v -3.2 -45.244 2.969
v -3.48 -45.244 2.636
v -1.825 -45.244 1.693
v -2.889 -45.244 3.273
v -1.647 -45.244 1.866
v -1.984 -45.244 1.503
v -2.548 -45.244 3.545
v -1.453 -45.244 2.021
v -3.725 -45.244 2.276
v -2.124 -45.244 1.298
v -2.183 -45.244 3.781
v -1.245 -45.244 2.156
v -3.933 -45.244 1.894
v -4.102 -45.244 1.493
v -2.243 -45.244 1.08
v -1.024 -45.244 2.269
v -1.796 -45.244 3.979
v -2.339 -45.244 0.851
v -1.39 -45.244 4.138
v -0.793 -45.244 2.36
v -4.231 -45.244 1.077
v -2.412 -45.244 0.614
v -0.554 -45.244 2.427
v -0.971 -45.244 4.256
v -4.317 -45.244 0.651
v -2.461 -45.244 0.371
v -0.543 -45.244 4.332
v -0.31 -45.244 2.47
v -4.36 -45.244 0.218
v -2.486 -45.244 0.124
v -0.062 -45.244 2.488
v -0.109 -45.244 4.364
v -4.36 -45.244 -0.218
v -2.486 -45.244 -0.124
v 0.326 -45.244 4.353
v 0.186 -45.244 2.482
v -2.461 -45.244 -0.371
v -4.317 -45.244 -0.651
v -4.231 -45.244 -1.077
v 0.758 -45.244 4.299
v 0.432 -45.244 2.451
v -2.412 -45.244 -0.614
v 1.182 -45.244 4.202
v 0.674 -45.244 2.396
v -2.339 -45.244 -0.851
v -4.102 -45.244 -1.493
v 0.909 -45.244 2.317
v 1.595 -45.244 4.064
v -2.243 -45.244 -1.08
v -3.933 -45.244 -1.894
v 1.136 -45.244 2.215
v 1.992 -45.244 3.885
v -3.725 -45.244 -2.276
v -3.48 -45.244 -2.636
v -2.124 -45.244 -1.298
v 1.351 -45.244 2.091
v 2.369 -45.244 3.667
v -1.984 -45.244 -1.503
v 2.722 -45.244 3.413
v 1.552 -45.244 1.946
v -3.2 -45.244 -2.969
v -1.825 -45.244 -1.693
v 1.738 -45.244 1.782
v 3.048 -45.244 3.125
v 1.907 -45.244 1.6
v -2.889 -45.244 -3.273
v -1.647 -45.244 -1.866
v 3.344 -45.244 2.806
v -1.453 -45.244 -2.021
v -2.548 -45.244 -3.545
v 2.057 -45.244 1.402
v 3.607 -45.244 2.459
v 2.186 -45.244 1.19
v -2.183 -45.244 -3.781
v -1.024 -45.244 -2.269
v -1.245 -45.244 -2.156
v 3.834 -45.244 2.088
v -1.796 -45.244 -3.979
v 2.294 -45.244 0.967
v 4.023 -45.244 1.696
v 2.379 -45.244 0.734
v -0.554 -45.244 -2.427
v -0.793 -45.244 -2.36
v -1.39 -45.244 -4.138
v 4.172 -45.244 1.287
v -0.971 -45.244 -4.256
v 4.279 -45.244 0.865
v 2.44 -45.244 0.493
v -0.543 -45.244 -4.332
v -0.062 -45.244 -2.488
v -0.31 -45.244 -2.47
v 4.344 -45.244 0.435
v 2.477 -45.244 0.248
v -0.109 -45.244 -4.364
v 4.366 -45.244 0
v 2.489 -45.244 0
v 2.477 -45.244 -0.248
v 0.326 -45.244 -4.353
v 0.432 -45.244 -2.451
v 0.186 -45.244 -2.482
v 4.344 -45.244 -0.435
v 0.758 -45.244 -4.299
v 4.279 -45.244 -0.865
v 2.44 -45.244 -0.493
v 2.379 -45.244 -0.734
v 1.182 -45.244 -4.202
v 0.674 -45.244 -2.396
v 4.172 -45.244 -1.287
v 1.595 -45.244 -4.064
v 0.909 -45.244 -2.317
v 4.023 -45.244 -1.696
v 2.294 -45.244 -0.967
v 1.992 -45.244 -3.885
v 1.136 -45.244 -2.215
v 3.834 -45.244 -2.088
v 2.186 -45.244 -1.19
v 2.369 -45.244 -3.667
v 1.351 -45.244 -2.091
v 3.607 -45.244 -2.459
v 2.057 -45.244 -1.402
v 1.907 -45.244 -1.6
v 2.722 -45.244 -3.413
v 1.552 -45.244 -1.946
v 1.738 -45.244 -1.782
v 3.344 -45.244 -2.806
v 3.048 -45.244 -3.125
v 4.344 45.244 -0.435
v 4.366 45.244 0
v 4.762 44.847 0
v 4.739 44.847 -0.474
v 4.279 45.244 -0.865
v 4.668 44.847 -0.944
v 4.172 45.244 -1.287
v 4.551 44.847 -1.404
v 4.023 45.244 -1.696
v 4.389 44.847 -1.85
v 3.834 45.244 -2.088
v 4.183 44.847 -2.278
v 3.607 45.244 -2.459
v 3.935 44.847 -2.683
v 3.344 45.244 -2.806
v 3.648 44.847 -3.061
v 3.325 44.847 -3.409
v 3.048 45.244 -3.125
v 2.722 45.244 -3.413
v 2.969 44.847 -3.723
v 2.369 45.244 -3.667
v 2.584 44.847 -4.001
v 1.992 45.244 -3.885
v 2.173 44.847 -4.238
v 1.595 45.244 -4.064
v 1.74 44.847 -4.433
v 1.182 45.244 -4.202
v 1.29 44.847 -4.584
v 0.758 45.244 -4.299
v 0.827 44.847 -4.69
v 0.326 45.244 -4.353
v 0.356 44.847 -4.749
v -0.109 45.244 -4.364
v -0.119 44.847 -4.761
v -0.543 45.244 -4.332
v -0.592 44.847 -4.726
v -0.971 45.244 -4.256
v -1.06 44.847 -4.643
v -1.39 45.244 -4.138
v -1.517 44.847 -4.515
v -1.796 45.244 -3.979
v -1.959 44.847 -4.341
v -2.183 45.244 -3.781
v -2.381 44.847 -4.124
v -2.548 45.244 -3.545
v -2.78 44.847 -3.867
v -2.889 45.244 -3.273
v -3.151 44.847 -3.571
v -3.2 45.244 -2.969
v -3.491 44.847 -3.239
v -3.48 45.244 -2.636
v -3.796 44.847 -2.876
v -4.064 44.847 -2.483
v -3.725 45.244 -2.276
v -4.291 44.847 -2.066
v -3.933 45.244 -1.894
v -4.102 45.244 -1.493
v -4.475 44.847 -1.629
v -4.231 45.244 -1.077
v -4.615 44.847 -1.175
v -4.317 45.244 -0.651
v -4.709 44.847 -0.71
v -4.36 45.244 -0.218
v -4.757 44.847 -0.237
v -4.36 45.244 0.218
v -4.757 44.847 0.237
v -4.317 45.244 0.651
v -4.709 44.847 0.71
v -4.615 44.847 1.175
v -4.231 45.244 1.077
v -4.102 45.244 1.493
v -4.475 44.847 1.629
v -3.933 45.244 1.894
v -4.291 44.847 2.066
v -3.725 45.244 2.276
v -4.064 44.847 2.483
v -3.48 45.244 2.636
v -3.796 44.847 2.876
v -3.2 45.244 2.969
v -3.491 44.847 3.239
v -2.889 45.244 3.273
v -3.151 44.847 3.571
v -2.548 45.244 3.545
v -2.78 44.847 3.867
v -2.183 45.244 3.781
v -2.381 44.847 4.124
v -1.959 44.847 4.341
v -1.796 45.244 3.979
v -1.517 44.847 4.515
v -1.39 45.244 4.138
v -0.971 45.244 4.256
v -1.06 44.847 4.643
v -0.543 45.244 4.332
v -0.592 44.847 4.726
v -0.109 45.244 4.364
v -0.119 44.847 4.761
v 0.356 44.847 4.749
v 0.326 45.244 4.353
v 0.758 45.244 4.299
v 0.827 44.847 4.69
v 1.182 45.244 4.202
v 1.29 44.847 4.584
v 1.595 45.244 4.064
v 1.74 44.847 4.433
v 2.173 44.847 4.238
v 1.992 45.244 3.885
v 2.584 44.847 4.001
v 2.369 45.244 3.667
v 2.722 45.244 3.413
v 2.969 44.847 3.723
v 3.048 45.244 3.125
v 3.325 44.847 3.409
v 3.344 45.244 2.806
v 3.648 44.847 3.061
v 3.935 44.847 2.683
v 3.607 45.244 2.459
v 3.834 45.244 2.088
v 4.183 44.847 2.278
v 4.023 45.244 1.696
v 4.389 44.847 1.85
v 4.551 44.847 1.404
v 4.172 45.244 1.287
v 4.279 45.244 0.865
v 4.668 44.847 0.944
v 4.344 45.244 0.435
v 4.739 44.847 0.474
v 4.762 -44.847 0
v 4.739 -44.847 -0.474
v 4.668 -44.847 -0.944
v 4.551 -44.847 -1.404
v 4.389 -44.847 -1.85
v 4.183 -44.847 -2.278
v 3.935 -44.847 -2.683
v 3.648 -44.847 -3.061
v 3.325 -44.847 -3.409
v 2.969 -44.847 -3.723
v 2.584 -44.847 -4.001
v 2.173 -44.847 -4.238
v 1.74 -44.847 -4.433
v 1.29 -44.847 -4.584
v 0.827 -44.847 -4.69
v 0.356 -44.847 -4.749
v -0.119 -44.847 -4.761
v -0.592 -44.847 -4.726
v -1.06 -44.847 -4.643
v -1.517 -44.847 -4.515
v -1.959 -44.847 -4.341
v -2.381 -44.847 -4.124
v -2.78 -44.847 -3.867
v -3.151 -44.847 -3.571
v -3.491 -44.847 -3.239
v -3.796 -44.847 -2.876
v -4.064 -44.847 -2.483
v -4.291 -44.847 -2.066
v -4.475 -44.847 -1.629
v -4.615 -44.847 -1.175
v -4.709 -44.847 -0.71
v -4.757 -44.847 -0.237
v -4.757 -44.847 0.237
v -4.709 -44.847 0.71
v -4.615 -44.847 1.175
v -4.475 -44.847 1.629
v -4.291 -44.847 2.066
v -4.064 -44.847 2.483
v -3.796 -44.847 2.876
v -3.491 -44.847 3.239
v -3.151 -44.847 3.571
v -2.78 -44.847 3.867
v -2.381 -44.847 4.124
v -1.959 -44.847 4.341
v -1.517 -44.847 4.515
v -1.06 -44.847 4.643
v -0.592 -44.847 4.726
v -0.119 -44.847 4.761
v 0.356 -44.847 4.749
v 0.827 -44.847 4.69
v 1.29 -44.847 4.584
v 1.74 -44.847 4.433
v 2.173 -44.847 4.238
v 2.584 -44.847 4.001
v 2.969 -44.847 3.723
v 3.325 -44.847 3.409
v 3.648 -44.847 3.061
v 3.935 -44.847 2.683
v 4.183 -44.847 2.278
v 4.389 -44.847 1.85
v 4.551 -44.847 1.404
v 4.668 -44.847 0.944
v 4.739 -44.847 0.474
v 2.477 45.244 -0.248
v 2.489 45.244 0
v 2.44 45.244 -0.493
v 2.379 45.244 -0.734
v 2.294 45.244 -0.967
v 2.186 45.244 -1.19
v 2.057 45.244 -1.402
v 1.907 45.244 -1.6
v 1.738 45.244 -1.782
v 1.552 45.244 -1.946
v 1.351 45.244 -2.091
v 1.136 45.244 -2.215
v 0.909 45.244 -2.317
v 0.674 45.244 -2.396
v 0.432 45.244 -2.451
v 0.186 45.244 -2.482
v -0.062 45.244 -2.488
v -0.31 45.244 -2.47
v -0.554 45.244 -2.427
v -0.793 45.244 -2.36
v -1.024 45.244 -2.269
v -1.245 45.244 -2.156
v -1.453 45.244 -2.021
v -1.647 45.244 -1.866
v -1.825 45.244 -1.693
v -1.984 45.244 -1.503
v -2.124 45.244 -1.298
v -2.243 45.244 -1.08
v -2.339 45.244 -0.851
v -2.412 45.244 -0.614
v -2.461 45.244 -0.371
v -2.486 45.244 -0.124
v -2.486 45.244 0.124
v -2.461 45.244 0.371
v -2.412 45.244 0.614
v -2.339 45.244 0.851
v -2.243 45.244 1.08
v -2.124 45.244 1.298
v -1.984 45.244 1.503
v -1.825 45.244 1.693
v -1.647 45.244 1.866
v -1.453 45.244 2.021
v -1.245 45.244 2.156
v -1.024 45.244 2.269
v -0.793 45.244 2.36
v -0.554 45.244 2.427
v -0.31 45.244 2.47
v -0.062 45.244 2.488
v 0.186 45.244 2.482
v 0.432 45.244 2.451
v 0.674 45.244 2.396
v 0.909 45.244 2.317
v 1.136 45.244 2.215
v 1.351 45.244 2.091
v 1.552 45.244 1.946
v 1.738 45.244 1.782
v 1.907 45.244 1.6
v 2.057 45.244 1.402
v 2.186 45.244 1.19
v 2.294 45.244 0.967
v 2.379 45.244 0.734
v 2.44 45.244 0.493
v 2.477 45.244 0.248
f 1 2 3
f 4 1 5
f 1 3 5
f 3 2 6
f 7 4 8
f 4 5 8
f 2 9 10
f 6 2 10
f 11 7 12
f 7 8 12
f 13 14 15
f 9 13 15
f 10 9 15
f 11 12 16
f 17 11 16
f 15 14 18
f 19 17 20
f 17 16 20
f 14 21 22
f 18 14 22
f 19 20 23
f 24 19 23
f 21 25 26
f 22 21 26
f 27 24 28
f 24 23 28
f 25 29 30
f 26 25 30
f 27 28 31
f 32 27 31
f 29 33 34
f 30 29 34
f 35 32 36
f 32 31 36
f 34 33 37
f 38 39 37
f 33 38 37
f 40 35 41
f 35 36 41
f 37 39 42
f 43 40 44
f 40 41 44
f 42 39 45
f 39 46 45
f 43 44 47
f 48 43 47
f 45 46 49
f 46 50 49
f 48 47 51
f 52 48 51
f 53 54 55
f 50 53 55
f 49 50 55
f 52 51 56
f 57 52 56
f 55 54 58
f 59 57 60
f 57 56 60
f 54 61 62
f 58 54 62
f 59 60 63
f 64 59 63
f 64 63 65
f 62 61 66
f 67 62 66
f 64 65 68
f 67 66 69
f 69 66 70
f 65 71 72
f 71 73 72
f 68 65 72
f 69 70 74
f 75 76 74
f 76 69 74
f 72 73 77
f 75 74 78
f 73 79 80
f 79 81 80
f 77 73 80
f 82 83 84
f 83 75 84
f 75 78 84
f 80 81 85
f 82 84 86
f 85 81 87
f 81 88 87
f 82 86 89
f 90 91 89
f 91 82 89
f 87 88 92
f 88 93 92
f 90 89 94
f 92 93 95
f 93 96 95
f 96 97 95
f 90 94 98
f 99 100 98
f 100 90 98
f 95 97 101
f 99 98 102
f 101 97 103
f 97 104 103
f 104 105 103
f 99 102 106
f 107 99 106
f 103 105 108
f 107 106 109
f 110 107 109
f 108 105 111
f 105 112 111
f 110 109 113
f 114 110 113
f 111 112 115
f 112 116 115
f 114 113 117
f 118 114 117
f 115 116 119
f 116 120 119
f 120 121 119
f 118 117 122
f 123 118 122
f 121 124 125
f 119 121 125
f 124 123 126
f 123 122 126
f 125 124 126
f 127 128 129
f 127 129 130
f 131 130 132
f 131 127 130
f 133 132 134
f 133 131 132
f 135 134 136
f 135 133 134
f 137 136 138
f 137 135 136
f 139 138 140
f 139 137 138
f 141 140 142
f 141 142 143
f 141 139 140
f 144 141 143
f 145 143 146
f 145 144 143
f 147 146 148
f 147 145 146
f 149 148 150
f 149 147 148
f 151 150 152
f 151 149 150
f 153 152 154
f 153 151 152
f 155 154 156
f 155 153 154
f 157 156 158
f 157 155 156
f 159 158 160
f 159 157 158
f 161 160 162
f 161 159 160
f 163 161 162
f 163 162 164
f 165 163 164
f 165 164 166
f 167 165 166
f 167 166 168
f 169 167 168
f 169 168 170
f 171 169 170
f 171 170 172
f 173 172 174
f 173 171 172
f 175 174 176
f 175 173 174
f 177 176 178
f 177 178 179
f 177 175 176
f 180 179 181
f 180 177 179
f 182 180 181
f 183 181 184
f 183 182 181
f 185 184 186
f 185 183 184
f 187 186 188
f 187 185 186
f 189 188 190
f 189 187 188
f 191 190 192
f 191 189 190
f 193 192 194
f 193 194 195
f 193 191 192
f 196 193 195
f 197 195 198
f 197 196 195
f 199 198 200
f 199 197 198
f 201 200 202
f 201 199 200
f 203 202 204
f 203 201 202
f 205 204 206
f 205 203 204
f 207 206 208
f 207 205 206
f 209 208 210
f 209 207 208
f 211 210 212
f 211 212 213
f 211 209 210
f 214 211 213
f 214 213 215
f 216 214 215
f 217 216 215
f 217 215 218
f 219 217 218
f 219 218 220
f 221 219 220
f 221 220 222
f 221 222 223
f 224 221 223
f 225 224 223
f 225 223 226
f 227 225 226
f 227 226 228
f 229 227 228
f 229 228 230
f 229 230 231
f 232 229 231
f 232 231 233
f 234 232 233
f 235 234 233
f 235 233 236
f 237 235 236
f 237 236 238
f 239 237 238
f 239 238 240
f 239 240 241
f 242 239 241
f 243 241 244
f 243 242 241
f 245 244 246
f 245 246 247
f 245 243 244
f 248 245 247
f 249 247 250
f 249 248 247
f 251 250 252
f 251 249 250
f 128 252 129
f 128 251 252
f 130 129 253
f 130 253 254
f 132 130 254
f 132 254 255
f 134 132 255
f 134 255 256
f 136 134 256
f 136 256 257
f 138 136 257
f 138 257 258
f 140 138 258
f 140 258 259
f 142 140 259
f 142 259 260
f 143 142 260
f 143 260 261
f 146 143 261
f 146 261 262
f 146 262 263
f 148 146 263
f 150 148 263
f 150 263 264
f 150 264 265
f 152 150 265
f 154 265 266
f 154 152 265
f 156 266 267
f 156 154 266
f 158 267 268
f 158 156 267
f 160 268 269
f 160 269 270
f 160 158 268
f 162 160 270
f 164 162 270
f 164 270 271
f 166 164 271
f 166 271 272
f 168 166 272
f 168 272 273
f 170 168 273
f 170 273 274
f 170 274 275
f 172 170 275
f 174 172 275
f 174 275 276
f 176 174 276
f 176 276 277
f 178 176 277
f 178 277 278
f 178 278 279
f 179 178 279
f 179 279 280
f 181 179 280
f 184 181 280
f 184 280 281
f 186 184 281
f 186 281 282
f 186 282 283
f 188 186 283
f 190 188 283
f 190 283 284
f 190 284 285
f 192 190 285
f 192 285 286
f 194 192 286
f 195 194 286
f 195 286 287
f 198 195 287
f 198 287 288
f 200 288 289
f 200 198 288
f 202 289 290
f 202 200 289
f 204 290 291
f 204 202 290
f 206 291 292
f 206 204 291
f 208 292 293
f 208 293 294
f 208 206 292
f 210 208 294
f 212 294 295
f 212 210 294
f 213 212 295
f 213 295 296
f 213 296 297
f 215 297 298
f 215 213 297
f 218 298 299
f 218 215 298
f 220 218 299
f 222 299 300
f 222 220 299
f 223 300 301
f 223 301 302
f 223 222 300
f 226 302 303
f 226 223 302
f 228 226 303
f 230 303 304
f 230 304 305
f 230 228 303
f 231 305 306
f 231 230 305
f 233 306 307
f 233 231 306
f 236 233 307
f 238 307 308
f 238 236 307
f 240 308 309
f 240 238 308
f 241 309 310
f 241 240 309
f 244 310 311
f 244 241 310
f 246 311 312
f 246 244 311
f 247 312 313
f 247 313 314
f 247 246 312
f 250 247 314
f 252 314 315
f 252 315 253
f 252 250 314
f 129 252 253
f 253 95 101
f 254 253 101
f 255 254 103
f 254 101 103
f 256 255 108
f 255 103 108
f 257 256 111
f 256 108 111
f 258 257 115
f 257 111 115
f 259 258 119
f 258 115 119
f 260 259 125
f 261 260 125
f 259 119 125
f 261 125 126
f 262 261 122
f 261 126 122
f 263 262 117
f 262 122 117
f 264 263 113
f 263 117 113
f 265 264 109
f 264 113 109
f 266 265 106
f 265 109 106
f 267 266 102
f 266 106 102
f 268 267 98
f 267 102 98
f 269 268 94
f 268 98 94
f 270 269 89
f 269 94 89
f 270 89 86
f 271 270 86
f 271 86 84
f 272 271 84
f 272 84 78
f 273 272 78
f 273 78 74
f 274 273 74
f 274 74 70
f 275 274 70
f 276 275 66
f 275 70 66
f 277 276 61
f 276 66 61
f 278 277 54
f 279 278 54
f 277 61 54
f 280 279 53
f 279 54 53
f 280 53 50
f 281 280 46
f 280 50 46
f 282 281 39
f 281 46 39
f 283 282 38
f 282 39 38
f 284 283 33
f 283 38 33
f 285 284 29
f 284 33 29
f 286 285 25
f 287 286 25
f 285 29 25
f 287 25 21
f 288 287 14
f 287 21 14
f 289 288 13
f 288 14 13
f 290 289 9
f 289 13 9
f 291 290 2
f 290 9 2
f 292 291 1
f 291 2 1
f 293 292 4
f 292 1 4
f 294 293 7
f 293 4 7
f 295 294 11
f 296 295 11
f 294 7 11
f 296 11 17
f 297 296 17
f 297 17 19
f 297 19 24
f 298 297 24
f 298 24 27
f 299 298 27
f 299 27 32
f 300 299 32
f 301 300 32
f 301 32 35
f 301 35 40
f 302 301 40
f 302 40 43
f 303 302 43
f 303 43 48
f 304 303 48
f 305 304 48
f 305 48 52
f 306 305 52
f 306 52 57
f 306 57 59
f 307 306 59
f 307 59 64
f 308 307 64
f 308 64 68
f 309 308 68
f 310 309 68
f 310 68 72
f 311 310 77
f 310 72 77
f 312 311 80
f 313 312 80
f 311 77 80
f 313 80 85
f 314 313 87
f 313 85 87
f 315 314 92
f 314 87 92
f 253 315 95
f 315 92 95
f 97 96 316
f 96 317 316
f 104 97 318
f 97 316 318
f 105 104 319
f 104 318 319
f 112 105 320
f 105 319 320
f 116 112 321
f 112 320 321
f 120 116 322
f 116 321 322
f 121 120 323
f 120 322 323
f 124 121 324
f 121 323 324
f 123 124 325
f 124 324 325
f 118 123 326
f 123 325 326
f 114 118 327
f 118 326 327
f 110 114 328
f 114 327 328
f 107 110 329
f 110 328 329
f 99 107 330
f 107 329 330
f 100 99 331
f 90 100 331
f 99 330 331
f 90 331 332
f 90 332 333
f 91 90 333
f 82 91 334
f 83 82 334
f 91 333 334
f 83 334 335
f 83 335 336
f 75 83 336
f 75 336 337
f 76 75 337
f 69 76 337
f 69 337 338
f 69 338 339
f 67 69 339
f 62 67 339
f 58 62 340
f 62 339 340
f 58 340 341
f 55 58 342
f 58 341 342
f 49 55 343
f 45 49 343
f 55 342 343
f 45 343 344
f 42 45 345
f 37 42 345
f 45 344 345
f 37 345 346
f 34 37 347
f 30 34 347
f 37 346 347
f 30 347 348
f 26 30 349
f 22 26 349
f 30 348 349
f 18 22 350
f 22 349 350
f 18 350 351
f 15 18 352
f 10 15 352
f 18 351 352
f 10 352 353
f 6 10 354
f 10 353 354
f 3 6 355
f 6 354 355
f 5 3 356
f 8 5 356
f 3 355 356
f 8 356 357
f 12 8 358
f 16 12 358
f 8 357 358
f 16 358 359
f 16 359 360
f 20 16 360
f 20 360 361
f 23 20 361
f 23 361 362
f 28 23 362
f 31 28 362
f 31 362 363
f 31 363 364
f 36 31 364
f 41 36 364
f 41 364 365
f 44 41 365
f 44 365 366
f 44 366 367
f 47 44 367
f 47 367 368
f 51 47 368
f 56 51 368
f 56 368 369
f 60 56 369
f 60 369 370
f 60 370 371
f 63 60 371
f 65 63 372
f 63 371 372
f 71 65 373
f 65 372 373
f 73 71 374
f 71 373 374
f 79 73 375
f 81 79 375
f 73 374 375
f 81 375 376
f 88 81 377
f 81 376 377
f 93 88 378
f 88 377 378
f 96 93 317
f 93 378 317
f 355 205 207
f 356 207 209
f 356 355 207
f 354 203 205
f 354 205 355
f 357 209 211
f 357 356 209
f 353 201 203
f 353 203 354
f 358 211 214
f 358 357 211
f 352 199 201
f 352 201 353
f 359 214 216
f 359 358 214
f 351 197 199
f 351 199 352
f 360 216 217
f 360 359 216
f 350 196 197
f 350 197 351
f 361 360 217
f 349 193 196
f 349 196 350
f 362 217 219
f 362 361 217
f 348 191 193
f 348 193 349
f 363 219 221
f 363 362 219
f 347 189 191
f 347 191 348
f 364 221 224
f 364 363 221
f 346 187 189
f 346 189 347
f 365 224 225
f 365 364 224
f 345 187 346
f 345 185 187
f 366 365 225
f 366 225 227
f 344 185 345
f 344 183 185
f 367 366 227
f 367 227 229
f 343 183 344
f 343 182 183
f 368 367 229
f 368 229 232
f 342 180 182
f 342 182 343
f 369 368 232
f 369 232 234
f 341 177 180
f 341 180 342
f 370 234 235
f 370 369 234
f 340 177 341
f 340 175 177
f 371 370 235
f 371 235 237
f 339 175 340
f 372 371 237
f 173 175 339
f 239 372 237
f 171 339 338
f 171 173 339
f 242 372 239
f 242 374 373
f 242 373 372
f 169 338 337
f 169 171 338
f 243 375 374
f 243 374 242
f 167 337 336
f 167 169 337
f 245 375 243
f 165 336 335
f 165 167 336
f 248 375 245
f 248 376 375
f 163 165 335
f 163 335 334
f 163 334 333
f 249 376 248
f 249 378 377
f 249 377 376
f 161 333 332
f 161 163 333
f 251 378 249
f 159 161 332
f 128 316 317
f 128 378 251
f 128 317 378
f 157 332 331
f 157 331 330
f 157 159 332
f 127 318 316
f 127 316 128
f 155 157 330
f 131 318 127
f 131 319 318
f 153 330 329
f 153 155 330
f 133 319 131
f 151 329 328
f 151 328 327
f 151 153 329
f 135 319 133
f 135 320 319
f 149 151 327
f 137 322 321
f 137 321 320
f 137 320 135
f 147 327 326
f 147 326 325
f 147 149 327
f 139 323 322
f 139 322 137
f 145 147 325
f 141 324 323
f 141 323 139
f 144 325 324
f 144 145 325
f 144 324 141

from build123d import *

# Parameters (mm, degrees)
CROQUIS2_R                = 4.7625
SALIENTE_EXTRUIR1_DEPTH   = 45.24375
CHAFL_N1_SIZE             = 0.396875
CLEARANCE_HOLE_DEPTH      = 46.742318771
CLEARANCE_HOLE_DEPTH_BACK = 46.742318771
CROQUIS4_R                = 2.4892


with BuildPart() as part:
    # Croquis2 → Saliente-Extruir1 (new, symmetric)
    with BuildSketch(Plane(origin=(0, 0, 0), x_dir=(1, 0, 0), z_dir=(0, 1, 0))):
        Circle(CROQUIS2_R)
    extrude(amount=SALIENTE_EXTRUIR1_DEPTH, both=True)

    # Chaflán1
    chafl_n1_edges = [part.edges().sort_by_distance(p)[0] for p in [
        (-4.7625, -45.24375, 0),
        (-4.7625, 45.24375, 0),
    ]]
    chamfer(chafl_n1_edges, length=CHAFL_N1_SIZE)

    # Croquis4 → Clearance Hole (cut, two sides: drawn at the far end of the back side and taken through both)
    with BuildSketch(Plane(origin=(0, 0, 0), x_dir=(1, 0, 0), z_dir=(0, 1, 0)).offset(-CLEARANCE_HOLE_DEPTH_BACK)):
        Circle(CROQUIS4_R)
    extrude(amount=CLEARANCE_HOLE_DEPTH + CLEARANCE_HOLE_DEPTH_BACK, mode=Mode.SUBTRACT)


solid = part.part
